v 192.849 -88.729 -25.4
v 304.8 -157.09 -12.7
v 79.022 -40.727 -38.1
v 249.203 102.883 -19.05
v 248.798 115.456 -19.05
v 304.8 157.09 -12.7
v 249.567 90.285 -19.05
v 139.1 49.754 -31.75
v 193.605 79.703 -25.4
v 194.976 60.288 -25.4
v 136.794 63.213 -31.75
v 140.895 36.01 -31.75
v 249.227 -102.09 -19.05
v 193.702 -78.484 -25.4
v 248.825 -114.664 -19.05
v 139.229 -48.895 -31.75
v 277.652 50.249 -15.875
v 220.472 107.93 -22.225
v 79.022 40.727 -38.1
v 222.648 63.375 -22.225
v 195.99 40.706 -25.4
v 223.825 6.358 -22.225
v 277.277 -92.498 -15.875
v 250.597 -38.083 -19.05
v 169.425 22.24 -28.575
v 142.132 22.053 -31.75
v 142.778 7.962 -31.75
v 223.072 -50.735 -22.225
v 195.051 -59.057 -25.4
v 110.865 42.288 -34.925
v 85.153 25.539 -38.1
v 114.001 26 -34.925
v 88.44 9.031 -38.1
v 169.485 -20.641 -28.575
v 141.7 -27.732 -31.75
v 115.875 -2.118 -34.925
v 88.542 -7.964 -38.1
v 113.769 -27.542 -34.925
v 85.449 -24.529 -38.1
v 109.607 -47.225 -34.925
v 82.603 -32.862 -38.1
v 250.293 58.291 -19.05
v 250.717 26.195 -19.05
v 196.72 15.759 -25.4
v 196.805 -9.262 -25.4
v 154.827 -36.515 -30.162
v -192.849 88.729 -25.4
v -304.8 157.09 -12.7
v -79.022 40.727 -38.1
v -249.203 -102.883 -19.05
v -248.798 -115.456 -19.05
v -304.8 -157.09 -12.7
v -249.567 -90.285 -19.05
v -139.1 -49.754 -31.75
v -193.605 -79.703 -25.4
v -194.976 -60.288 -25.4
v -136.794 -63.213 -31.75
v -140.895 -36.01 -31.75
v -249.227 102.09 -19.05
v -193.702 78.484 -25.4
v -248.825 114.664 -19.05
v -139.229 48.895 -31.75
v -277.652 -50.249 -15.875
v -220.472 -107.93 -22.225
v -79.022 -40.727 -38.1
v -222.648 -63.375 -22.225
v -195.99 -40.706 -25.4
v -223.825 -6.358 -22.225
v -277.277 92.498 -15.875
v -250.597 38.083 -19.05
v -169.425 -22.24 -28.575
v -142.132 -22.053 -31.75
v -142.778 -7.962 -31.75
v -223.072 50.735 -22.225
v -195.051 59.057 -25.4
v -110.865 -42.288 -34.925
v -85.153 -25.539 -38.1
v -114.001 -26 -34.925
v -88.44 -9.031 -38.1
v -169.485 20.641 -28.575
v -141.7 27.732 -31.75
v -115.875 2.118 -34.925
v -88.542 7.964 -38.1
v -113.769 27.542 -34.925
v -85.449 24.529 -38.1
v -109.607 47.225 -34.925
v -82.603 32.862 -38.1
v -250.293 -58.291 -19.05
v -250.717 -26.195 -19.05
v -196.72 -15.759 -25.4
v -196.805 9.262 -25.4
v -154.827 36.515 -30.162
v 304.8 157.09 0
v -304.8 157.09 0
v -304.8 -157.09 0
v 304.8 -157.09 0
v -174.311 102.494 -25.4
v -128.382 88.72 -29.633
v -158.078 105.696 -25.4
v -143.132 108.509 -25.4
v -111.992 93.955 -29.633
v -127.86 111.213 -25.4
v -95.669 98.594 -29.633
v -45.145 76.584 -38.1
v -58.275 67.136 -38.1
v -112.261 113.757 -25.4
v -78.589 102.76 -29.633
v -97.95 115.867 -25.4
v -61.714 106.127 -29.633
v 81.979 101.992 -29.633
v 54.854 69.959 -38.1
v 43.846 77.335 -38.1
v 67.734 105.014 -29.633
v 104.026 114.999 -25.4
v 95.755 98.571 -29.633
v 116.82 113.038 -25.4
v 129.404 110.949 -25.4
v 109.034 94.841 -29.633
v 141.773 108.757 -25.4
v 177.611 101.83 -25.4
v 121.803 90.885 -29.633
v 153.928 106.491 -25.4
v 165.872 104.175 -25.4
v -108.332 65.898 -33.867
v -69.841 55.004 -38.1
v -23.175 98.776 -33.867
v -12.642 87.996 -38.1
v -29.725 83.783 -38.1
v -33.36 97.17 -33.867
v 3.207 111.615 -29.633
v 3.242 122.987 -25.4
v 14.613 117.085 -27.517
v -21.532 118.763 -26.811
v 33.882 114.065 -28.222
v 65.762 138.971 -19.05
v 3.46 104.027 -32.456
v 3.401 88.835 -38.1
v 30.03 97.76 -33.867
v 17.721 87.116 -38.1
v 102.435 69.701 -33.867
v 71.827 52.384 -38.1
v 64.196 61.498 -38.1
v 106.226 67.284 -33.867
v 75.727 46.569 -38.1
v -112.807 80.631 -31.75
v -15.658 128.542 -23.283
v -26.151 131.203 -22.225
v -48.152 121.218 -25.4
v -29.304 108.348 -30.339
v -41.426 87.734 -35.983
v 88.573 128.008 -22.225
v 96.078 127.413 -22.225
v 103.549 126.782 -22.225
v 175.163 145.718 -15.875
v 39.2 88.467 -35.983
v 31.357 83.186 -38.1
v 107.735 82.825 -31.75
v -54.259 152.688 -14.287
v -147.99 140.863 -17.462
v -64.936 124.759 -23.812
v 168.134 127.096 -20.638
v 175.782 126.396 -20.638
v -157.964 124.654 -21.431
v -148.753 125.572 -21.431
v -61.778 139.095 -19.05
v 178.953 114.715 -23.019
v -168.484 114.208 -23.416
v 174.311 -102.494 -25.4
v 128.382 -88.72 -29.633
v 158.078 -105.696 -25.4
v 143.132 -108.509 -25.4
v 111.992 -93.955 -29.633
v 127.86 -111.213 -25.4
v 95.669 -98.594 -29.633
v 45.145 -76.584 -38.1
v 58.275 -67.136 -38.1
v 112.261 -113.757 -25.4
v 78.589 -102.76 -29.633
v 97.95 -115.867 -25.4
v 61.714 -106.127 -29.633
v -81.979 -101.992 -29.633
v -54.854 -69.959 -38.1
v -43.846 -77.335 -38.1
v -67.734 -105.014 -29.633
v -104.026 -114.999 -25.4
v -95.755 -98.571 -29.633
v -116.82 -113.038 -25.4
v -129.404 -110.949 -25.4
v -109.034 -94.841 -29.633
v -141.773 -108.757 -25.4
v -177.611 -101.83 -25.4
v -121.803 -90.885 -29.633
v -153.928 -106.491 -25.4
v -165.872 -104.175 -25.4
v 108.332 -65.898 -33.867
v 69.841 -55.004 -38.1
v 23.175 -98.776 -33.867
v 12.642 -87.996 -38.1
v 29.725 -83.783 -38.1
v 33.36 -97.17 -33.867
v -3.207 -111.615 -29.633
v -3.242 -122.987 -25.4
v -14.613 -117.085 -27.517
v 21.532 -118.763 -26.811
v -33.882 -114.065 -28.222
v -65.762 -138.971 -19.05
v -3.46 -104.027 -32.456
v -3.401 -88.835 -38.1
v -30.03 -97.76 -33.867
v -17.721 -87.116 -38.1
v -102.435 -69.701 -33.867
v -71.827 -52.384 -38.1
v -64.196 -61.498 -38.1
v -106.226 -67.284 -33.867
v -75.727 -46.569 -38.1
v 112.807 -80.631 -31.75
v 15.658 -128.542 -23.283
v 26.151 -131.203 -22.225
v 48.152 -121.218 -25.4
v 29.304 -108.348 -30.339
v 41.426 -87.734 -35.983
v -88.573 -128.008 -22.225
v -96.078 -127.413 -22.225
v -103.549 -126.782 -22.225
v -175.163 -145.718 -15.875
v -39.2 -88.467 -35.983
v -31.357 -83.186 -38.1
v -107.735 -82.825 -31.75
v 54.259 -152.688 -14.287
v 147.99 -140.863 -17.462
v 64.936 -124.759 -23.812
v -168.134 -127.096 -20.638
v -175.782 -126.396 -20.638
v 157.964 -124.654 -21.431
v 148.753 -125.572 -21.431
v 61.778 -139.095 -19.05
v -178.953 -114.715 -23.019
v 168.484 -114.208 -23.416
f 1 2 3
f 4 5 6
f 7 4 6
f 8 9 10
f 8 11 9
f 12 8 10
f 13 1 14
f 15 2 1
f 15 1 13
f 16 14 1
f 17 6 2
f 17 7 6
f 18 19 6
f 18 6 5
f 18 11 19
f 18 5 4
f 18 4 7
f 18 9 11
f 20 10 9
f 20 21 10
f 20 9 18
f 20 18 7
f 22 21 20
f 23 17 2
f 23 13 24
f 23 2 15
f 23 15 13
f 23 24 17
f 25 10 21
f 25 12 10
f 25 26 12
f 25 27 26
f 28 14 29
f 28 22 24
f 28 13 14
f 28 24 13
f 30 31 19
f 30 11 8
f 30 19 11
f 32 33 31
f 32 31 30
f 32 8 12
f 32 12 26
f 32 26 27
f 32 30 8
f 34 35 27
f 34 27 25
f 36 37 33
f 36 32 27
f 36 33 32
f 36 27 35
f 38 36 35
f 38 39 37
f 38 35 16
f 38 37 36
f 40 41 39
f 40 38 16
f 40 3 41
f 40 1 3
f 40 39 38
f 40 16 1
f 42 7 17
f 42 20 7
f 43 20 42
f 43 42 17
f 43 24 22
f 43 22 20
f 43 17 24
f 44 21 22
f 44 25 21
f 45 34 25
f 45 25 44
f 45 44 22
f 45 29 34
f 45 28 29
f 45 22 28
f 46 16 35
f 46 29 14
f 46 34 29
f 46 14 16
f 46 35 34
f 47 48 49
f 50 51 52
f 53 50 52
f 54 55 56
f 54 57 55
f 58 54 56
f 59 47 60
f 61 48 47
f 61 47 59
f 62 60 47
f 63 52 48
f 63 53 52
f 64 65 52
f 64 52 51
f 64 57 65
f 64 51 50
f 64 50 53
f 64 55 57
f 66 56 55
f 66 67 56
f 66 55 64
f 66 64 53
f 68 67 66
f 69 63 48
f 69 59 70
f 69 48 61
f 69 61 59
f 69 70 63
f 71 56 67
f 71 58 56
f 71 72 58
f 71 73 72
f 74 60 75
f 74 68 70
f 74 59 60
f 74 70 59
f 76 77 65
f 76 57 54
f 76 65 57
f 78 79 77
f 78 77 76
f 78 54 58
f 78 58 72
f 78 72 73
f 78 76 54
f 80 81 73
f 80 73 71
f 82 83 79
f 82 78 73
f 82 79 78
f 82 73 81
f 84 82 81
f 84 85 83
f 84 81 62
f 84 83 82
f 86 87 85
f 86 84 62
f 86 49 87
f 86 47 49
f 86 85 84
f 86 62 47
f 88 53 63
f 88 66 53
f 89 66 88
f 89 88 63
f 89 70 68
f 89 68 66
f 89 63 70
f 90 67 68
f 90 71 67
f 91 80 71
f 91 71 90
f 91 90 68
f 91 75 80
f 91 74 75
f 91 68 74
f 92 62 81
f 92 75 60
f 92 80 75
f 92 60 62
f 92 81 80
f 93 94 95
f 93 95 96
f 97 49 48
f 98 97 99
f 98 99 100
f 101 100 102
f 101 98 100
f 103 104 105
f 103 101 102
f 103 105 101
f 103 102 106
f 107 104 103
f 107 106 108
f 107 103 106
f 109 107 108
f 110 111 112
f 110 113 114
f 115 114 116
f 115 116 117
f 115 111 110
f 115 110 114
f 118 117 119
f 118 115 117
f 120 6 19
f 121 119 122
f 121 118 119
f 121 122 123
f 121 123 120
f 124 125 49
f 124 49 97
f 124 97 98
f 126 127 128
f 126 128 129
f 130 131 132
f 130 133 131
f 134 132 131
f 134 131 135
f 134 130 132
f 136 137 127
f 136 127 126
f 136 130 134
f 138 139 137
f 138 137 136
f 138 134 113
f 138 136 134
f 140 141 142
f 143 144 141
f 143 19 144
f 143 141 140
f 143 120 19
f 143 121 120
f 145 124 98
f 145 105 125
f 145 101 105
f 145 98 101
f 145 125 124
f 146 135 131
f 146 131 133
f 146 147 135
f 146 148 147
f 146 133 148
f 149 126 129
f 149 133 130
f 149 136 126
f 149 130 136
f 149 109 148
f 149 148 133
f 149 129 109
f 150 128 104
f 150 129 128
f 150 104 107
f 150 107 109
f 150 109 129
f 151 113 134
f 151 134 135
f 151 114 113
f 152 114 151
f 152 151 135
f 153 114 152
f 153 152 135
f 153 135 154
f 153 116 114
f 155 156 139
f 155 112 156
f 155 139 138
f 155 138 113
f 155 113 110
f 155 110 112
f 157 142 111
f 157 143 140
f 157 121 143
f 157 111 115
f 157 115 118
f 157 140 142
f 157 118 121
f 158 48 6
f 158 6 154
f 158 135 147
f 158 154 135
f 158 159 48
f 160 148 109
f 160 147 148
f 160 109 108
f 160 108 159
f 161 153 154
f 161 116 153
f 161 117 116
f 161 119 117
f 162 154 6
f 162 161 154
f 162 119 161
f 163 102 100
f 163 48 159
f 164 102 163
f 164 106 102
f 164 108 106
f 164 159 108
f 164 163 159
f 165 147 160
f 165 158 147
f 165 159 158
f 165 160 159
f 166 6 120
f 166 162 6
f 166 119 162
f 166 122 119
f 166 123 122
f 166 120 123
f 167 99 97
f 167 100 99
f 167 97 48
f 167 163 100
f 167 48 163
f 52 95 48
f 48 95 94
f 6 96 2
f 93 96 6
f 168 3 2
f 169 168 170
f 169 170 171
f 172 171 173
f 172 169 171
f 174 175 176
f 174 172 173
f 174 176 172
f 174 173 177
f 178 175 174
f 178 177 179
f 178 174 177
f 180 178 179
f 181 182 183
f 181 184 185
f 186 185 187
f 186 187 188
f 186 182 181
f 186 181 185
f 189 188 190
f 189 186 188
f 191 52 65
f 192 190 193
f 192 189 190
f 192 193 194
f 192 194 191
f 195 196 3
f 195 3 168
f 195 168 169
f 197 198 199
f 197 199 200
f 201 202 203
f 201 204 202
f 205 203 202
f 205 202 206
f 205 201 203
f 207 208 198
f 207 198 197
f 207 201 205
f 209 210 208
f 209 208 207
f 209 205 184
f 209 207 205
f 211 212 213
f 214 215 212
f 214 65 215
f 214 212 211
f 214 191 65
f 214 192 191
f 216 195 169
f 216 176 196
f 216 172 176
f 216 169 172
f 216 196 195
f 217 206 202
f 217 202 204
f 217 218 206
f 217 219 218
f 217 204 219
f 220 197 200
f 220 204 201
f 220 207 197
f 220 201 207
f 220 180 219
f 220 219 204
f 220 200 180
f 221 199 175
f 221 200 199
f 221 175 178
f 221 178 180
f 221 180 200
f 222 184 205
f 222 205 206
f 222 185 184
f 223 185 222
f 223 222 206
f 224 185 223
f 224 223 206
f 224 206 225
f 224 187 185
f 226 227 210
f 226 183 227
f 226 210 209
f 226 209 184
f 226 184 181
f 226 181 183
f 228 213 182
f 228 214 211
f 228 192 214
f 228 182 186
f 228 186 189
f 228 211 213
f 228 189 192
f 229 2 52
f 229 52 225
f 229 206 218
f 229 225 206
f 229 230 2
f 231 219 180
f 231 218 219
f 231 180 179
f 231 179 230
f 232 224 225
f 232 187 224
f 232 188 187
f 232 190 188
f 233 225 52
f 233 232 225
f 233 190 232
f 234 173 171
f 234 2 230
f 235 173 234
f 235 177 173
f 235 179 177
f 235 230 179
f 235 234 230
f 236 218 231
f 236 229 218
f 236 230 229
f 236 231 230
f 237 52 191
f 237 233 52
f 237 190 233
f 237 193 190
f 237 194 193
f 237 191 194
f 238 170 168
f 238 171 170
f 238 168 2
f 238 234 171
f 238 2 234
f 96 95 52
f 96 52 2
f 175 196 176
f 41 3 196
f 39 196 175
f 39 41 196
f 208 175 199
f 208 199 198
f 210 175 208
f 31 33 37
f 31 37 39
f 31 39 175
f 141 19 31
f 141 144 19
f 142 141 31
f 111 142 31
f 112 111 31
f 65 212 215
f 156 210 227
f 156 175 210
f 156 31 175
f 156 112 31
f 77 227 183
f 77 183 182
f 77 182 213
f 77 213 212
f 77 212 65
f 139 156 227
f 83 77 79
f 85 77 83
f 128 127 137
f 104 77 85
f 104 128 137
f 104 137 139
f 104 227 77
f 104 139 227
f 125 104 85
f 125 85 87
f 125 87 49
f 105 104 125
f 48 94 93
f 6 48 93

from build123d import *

# Parameters (mm, degrees)
SKETCH1_W           = 609.6
SKETCH1_H           = 314.180648672
BOSS_EXTRUDE1_DEPTH = 12.7


with BuildPart() as part:
    # Sketch1 → Boss-Extrude1 (new body)
    with BuildSketch(Plane.XY):
        Rectangle(SKETCH1_W, SKETCH1_H)
    extrude(amount=-BOSS_EXTRUDE1_DEPTH)

    # Loft1: read off the stored shape, not the designer's step
    # Loft1: loft between two sections, ruled curve by curve
    loft1_from = [
        Edge.make_bspline([(304.8, 157.090324336, -12.7), (304.8, 143.999463975, -12.7), (304.8, 130.908603613, -12.7), (304.8, 104.726882891, -12.7), (304.8, 91.636022529, -12.7), (304.8, 65.454301807, -12.7), (304.8, 52.363441445, -12.7), (304.8, 26.181720723, -12.7), (304.8, 13.090860361, -12.7), (304.8, -13.090860361, -12.7), (304.8, -26.181720723, -12.7), (304.8, -52.363441445, -12.7), (304.8, -65.454301807, -12.7), (304.8, -91.636022529, -12.7), (304.8, -104.726882891, -12.7), (304.8, -130.908603613, -12.7), (304.8, -143.999463975, -12.7), (304.8, -157.090324336, -12.7)], [0, 0, 0, 0, 0.125, 0.125, 0.25, 0.25, 0.375, 0.375, 0.5, 0.5, 0.625, 0.625, 0.75, 0.75, 0.875, 0.875, 1, 1, 1, 1], 3),
        Edge.make_bspline([(304.8, -157.090324336, -12.7), (292.1, -157.090324336, -12.7), (279.4, -157.090324336, -12.7), (254, -157.090324336, -12.7), (241.3, -157.090324336, -12.7), (215.9, -157.090324336, -12.7), (203.2, -157.090324336, -12.7), (177.8, -157.090324336, -12.7), (165.1, -157.090324336, -12.7), (139.7, -157.090324336, -12.7), (127, -157.090324336, -12.7), (101.6, -157.090324336, -12.7), (88.9, -157.090324336, -12.7), (63.5, -157.090324336, -12.7), (50.8, -157.090324336, -12.7), (25.4, -157.090324336, -12.7), (12.7, -157.090324336, -12.7), (-12.7, -157.090324336, -12.7), (-25.4, -157.090324336, -12.7), (-50.8, -157.090324336, -12.7), (-63.5, -157.090324336, -12.7), (-88.9, -157.090324336, -12.7), (-101.6, -157.090324336, -12.7), (-127, -157.090324336, -12.7), (-139.7, -157.090324336, -12.7), (-165.1, -157.090324336, -12.7), (-177.8, -157.090324336, -12.7), (-203.2, -157.090324336, -12.7), (-215.9, -157.090324336, -12.7), (-241.3, -157.090324336, -12.7), (-254, -157.090324336, -12.7), (-279.4, -157.090324336, -12.7), (-292.1, -157.090324336, -12.7), (-304.8, -157.090324336, -12.7)], [0, 0, 0, 0, 0.0625, 0.0625, 0.125, 0.125, 0.1875, 0.1875, 0.25, 0.25, 0.3125, 0.3125, 0.375, 0.375, 0.4375, 0.4375, 0.5, 0.5, 0.5625, 0.5625, 0.625, 0.625, 0.6875, 0.6875, 0.75, 0.75, 0.8125, 0.8125, 0.875, 0.875, 0.9375, 0.9375, 1, 1, 1, 1], 3),
        Edge.make_bspline([(-304.8, 157.090324336, -12.7), (-292.1, 157.090324336, -12.7), (-279.4, 157.090324336, -12.7), (-254, 157.090324336, -12.7), (-241.3, 157.090324336, -12.7), (-215.9, 157.090324336, -12.7), (-203.2, 157.090324336, -12.7), (-177.8, 157.090324336, -12.7), (-165.1, 157.090324336, -12.7), (-139.7, 157.090324336, -12.7), (-127, 157.090324336, -12.7), (-101.6, 157.090324336, -12.7), (-88.9, 157.090324336, -12.7), (-63.5, 157.090324336, -12.7), (-50.8, 157.090324336, -12.7), (-25.4, 157.090324336, -12.7), (-12.7, 157.090324336, -12.7), (12.7, 157.090324336, -12.7), (25.4, 157.090324336, -12.7), (50.8, 157.090324336, -12.7), (63.5, 157.090324336, -12.7), (88.9, 157.090324336, -12.7), (101.6, 157.090324336, -12.7), (127, 157.090324336, -12.7), (139.7, 157.090324336, -12.7), (165.1, 157.090324336, -12.7), (177.8, 157.090324336, -12.7), (203.2, 157.090324336, -12.7), (215.9, 157.090324336, -12.7), (241.3, 157.090324336, -12.7), (254, 157.090324336, -12.7), (279.4, 157.090324336, -12.7), (292.1, 157.090324336, -12.7), (304.8, 157.090324336, -12.7)], [0, 0, 0, 0, 0.0625, 0.0625, 0.125, 0.125, 0.1875, 0.1875, 0.25, 0.25, 0.3125, 0.3125, 0.375, 0.375, 0.4375, 0.4375, 0.5, 0.5, 0.5625, 0.5625, 0.625, 0.625, 0.6875, 0.6875, 0.75, 0.75, 0.8125, 0.8125, 0.875, 0.875, 0.9375, 0.9375, 1, 1, 1, 1], 3),
        Edge.make_bspline([(-304.8, -157.090324336, -12.7), (-304.8, -143.999463975, -12.7), (-304.8, -130.908603613, -12.7), (-304.8, -104.726882891, -12.7), (-304.8, -91.636022529, -12.7), (-304.8, -65.454301807, -12.7), (-304.8, -52.363441445, -12.7), (-304.8, -26.181720723, -12.7), (-304.8, -13.090860361, -12.7), (-304.8, 13.090860361, -12.7), (-304.8, 26.181720723, -12.7), (-304.8, 52.363441445, -12.7), (-304.8, 65.454301807, -12.7), (-304.8, 91.636022529, -12.7), (-304.8, 104.726882891, -12.7), (-304.8, 130.908603613, -12.7), (-304.8, 143.999463975, -12.7), (-304.8, 157.090324336, -12.7)], [0, 0, 0, 0, 0.125, 0.125, 0.25, 0.25, 0.375, 0.375, 0.5, 0.5, 0.625, 0.625, 0.75, 0.75, 0.875, 0.875, 1, 1, 1, 1], 3),
    ]
    loft1_to = [
        Edge.make_bspline([(79.022222222, 40.727121124, -38.1), (80.577057613, 37.710297337, -38.1), (81.980389053, 34.561909453, -38.1), (84.430287104, 28.050604162, -38.1), (85.476699573, 24.687769705, -38.1), (87.169677239, 17.810095816, -38.1), (87.816120347, 14.295394928, -38.1), (88.681315551, 7.187042588, -38.1), (88.9, 3.593569511, -38.1), (88.9, -3.593569511, -38.1), (88.681315551, -7.187042588, -38.1), (87.816120347, -14.295394928, -38.1), (87.169677239, -17.810095816, -38.1), (85.476699573, -24.687769705, -38.1), (84.430287104, -28.050604162, -38.1), (81.980389053, -34.561909453, -38.1), (80.577057613, -37.710297337, -38.1), (79.022222222, -40.727121124, -38.1)], [0, 0, 0, 0, 0.125, 0.125, 0.25, 0.25, 0.375, 0.375, 0.5, 0.5, 0.625, 0.625, 0.75, 0.75, 0.875, 0.875, 1, 1, 1, 1], 3),
        Edge.make_bspline([(79.022222222, -40.727121124, -38.1), (77.513810329, -43.653870095, -38.1), (75.79123489, -46.596780367, -38.1), (71.874617054, -52.43672997, -38.1), (69.680294943, -55.333709982, -38.1), (64.792903277, -60.983954027, -38.1), (62.099546472, -63.737031565, -38.1), (56.211815103, -68.985467365, -38.1), (53.017211054, -71.480494923, -38.1), (46.157754062, -76.090390736, -38.1), (42.492809932, -78.204805568, -38.1), (34.761608604, -81.934492597, -38.1), (30.695467957, -83.549260467, -38.1), (22.268836934, -86.178823265, -38.1), (17.908694381, -87.193176196, -38.1), (9.032113746, -88.553894498, -38.1), (4.516207395, -88.9, -38.1), (-4.516207395, -88.9, -38.1), (-9.032113746, -88.553894498, -38.1), (-17.908694381, -87.193176196, -38.1), (-22.268836934, -86.178823265, -38.1), (-30.695467957, -83.549260467, -38.1), (-34.761608604, -81.934492597, -38.1), (-42.492809932, -78.204805568, -38.1), (-46.157754062, -76.090390736, -38.1), (-53.017211054, -71.480494923, -38.1), (-56.211815103, -68.985467365, -38.1), (-62.099546472, -63.737031565, -38.1), (-64.792903277, -60.983954027, -38.1), (-69.680294943, -55.333709982, -38.1), (-71.874617054, -52.43672997, -38.1), (-75.79123489, -46.596780367, -38.1), (-77.513810329, -43.653870095, -38.1), (-79.022222222, -40.727121124, -38.1)], [0, 0, 0, 0, 0.0625, 0.0625, 0.125, 0.125, 0.1875, 0.1875, 0.25, 0.25, 0.3125, 0.3125, 0.375, 0.375, 0.4375, 0.4375, 0.5, 0.5, 0.5625, 0.5625, 0.625, 0.625, 0.6875, 0.6875, 0.75, 0.75, 0.8125, 0.8125, 0.875, 0.875, 0.9375, 0.9375, 1, 1, 1, 1], 3),
        Edge.make_bspline([(-79.022222222, 40.727121124, -38.1), (-77.513810329, 43.653870095, -38.1), (-75.79123489, 46.596780367, -38.1), (-71.874617054, 52.43672997, -38.1), (-69.680294943, 55.333709982, -38.1), (-64.792903277, 60.983954027, -38.1), (-62.099546472, 63.737031565, -38.1), (-56.211815103, 68.985467365, -38.1), (-53.017211054, 71.480494923, -38.1), (-46.157754062, 76.090390736, -38.1), (-42.492809932, 78.204805568, -38.1), (-34.761608604, 81.934492597, -38.1), (-30.695467957, 83.549260467, -38.1), (-22.268836934, 86.178823265, -38.1), (-17.908694381, 87.193176196, -38.1), (-9.032113746, 88.553894498, -38.1), (-4.516207395, 88.9, -38.1), (4.516207395, 88.9, -38.1), (9.032113746, 88.553894498, -38.1), (17.908694381, 87.193176196, -38.1), (22.268836934, 86.178823265, -38.1), (30.695467957, 83.549260467, -38.1), (34.761608604, 81.934492597, -38.1), (42.492809932, 78.204805568, -38.1), (46.157754062, 76.090390736, -38.1), (53.017211054, 71.480494923, -38.1), (56.211815103, 68.985467365, -38.1), (62.099546472, 63.737031565, -38.1), (64.792903277, 60.983954027, -38.1), (69.680294943, 55.333709982, -38.1), (71.874617054, 52.43672997, -38.1), (75.79123489, 46.596780367, -38.1), (77.513810329, 43.653870095, -38.1), (79.022222222, 40.727121124, -38.1)], [0, 0, 0, 0, 0.0625, 0.0625, 0.125, 0.125, 0.1875, 0.1875, 0.25, 0.25, 0.3125, 0.3125, 0.375, 0.375, 0.4375, 0.4375, 0.5, 0.5, 0.5625, 0.5625, 0.625, 0.625, 0.6875, 0.6875, 0.75, 0.75, 0.8125, 0.8125, 0.875, 0.875, 0.9375, 0.9375, 1, 1, 1, 1], 3),
        Edge.make_bspline([(-79.022222222, -40.727121124, -38.1), (-80.577057613, -37.710297337, -38.1), (-81.980389053, -34.561909453, -38.1), (-84.430287104, -28.050604162, -38.1), (-85.476699573, -24.687769705, -38.1), (-87.169677239, -17.810095816, -38.1), (-87.816120347, -14.295394928, -38.1), (-88.681315551, -7.187042588, -38.1), (-88.9, -3.593569511, -38.1), (-88.9, 3.593569511, -38.1), (-88.681315551, 7.187042588, -38.1), (-87.816120347, 14.295394928, -38.1), (-87.169677239, 17.810095816, -38.1), (-85.476699573, 24.687769705, -38.1), (-84.430287104, 28.050604162, -38.1), (-81.980389053, 34.561909453, -38.1), (-80.577057613, 37.710297337, -38.1), (-79.022222222, 40.727121124, -38.1)], [0, 0, 0, 0, 0.125, 0.125, 0.25, 0.25, 0.375, 0.375, 0.5, 0.5, 0.625, 0.625, 0.75, 0.75, 0.875, 0.875, 1, 1, 1, 1], 3),
    ]
    loft1 = Solid(Shell([*[Face.make_surface_from_curves(loft1_from[k], loft1_to[k]) for k in range(4)], Face(Wire(loft1_from)), Face(Wire(loft1_to))]))
    add(loft1)


solid = part.part
